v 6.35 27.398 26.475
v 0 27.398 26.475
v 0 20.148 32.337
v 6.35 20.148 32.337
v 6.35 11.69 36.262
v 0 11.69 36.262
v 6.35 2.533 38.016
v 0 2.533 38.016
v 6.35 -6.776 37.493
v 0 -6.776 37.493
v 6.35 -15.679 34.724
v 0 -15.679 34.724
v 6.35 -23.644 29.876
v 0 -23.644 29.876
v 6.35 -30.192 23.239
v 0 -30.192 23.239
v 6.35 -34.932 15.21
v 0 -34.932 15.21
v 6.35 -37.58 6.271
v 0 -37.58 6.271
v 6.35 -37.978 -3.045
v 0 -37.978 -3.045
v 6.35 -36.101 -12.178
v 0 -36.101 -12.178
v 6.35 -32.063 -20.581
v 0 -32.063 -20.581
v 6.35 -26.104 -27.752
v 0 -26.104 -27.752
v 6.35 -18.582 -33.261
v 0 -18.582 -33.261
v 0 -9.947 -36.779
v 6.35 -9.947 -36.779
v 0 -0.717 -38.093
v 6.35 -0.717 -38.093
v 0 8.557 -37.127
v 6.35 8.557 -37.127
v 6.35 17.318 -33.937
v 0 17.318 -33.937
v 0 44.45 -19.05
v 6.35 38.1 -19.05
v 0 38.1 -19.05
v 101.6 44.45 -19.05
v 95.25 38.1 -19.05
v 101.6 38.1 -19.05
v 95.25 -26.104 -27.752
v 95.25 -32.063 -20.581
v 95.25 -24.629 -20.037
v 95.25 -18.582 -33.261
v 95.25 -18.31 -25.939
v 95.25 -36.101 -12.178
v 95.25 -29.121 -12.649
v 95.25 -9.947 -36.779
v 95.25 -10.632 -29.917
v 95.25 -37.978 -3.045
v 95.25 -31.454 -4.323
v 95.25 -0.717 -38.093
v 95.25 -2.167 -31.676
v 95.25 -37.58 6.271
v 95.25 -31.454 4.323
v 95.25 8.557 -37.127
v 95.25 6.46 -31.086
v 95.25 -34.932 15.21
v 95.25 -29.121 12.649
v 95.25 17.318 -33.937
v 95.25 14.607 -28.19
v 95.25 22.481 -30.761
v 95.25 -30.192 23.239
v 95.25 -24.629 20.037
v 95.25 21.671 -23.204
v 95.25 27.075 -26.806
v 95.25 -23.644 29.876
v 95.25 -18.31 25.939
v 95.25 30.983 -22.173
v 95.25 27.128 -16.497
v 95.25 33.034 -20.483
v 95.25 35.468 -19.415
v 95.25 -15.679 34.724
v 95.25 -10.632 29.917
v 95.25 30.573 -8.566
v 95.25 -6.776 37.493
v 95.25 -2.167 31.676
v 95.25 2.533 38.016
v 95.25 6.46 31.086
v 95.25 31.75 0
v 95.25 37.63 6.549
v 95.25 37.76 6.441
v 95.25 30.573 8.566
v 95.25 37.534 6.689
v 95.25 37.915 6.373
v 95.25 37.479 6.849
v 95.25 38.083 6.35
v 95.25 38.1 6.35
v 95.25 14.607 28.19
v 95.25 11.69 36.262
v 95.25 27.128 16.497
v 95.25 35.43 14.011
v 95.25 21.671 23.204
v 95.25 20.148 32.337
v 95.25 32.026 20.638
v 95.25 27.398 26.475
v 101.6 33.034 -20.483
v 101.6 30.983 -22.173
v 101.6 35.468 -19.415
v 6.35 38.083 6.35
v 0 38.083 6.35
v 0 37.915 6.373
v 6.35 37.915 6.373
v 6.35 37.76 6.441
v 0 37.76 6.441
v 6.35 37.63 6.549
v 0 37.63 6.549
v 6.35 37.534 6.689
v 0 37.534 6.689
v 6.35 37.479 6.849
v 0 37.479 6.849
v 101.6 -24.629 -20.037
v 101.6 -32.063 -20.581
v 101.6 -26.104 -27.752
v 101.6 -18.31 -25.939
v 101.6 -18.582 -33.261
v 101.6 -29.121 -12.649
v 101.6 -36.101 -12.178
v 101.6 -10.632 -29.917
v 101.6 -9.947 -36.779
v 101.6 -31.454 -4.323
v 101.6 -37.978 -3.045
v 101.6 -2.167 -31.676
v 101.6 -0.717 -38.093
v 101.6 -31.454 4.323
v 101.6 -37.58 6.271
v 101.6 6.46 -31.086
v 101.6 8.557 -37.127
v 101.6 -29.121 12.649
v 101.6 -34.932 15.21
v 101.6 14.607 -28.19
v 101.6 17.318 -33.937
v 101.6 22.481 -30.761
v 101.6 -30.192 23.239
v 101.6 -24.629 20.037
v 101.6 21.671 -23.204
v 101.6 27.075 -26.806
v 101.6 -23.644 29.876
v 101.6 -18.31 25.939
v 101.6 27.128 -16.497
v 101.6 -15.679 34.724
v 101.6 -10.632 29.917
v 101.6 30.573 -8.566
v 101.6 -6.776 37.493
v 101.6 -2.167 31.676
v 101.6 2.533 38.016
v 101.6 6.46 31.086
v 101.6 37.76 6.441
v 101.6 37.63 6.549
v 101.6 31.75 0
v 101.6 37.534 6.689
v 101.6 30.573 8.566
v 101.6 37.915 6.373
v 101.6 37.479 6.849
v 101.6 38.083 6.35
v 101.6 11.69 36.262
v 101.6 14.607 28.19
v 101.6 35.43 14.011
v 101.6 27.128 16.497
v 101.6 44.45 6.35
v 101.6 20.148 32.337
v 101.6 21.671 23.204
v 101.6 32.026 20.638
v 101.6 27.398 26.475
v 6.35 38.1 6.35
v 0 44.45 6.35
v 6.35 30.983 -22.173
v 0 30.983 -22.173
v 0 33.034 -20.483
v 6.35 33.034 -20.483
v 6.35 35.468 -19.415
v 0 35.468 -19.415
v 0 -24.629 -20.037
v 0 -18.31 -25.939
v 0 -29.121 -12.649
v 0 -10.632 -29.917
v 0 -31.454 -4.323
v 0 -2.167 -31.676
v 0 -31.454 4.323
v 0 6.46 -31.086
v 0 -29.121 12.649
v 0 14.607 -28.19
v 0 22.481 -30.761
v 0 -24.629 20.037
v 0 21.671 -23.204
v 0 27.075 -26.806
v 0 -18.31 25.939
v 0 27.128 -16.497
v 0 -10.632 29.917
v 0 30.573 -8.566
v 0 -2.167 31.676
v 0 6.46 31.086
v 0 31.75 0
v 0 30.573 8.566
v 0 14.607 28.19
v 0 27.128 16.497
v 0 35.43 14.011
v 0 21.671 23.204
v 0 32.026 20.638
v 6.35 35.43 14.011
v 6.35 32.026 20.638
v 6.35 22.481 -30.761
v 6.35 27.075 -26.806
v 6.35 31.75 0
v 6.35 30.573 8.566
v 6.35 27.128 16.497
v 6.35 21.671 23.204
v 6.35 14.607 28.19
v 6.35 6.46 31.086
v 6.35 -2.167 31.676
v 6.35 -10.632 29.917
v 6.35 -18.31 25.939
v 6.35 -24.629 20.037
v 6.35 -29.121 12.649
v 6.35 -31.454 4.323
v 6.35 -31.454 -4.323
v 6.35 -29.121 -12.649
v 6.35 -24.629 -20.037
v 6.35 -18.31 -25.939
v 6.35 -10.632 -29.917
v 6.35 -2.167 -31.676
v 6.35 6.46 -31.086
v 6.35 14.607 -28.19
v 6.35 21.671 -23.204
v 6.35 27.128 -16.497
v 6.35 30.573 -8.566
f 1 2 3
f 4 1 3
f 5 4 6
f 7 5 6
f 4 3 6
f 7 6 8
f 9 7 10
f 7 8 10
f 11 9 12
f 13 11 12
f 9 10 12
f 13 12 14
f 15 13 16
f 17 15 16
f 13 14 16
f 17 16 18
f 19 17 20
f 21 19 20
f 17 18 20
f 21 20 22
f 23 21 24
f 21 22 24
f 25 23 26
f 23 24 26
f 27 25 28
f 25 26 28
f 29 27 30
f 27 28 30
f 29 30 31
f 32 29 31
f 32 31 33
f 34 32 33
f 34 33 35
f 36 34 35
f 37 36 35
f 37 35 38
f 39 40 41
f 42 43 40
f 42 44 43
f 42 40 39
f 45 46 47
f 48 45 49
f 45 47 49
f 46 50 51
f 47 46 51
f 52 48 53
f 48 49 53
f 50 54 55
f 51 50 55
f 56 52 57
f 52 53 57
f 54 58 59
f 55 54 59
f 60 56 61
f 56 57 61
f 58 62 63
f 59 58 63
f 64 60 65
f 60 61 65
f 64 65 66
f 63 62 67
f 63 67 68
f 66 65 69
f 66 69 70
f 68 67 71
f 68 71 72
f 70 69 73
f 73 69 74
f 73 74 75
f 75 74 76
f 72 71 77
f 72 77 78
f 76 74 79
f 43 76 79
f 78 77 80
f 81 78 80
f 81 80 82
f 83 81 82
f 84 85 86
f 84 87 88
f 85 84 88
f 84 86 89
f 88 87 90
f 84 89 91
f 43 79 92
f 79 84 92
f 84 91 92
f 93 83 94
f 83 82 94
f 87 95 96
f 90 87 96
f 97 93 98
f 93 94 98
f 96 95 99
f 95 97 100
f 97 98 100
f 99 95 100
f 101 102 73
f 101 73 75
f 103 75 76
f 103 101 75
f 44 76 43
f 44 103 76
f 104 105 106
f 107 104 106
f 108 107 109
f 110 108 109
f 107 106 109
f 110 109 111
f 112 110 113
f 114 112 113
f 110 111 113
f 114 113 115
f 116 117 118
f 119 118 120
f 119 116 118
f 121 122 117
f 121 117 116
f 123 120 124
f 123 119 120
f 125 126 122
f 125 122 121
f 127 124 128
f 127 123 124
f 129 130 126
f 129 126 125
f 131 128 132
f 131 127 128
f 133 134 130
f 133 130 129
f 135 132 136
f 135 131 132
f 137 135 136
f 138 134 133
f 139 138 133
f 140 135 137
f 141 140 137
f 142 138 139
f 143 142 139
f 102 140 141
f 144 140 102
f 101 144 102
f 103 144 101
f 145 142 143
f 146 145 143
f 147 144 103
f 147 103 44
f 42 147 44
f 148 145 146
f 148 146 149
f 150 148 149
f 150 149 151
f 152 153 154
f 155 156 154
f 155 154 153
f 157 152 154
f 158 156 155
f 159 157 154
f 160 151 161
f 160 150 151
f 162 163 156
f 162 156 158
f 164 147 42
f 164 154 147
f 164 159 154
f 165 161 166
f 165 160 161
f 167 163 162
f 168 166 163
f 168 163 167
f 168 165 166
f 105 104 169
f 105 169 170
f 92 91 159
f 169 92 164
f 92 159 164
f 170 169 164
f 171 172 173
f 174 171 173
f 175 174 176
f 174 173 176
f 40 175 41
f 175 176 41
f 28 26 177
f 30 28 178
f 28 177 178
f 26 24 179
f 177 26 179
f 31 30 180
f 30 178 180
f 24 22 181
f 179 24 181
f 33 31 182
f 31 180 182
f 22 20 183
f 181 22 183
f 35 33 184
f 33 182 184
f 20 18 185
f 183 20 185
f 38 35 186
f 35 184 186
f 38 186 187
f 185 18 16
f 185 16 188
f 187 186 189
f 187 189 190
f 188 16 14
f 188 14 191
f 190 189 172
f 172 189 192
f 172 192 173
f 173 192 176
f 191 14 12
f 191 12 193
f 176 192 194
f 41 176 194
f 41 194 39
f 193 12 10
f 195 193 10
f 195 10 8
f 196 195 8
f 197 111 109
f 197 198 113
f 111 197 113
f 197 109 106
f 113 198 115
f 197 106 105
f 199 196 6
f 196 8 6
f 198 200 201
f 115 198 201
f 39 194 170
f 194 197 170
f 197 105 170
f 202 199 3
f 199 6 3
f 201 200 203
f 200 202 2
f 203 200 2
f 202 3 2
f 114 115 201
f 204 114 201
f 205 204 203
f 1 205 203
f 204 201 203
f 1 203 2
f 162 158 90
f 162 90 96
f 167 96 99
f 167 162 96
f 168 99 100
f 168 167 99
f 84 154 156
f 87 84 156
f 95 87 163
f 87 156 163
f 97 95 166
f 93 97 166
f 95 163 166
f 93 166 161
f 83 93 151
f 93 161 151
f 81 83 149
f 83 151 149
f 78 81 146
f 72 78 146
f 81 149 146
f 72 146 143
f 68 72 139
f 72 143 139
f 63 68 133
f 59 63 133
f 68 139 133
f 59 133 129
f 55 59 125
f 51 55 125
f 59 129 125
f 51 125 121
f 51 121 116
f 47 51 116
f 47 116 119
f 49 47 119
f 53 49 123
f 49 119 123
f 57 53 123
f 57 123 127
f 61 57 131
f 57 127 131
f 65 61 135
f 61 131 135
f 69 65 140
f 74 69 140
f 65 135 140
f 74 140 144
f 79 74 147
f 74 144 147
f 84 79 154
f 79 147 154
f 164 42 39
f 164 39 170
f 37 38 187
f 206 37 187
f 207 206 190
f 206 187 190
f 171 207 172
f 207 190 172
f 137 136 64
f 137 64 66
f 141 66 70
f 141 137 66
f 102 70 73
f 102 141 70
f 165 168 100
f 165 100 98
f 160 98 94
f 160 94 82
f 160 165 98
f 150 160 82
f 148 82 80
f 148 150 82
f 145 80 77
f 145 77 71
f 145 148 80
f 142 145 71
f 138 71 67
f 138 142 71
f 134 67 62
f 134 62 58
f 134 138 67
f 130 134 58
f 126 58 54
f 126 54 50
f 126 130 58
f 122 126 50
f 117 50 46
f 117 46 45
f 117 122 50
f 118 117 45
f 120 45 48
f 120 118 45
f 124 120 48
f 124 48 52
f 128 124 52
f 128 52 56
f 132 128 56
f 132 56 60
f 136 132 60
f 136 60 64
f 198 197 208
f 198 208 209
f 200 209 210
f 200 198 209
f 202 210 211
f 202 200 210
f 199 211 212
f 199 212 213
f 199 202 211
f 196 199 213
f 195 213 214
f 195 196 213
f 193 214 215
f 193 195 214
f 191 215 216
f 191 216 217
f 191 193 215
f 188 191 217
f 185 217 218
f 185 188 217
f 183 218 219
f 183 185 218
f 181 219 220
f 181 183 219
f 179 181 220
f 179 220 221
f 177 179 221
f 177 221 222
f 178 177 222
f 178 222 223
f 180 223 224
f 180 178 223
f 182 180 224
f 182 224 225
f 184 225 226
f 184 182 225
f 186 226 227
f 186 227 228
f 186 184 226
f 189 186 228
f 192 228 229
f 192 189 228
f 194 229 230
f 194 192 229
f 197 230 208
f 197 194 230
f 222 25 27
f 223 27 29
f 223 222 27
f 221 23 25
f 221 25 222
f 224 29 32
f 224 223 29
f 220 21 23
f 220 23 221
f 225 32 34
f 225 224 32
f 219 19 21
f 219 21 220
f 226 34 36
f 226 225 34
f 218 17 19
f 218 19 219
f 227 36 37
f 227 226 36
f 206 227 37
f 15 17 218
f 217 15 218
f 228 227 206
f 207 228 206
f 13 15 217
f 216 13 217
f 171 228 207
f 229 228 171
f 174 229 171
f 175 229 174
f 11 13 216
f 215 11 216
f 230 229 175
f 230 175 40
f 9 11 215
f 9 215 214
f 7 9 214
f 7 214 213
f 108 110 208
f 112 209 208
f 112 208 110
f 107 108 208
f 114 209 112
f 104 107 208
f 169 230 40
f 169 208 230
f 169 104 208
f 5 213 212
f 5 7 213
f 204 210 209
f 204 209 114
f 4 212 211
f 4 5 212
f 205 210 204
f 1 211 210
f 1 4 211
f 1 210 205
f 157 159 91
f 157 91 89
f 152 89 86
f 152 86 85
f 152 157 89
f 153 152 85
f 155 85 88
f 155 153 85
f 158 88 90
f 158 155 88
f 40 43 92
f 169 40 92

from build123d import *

# Parameters (mm, degrees)
F0_R     = 31.75
F1_DEPTH = 6.35
F2_W     = 6.35
F2_H     = 25.399766
F3_DEPTH = 44.45


with BuildPart() as f1:
    # F0 (on Right) → F1 (new body)
    with BuildSketch(Plane.YZ):
        with BuildLine():
            ThreePointArc((37.479318, 6.849139), (33.890578, 17.408007), (27.398215, 26.475419))
            ThreePointArc((27.398215, 26.475419), (-37.580446, 6.270574), (17.318016, -33.936652))
            ThreePointArc((17.318016, -33.936652), (24.856502, -28.874977), (30.983175, -22.173246))
            ThreePointArc((30.983175, -22.173246), (36.27719, -11.64369), (38.1, 0))
            ThreePointArc((38.1, 0), (37.944512, 3.438602), (37.479318, 6.849139))
        make_face()
        Circle(F0_R, mode=Mode.SUBTRACT)
        with BuildLine():
            ThreePointArc((38.083032, 6.349766), (37.691291, 6.490788), (37.479318, 6.849139))
            ThreePointArc((37.479318, 6.849139), (37.944512, 3.438602), (38.1, 0))
            ThreePointArc((38.1, 0), (36.27719, -11.64369), (30.983175, -22.173246))
            ThreePointArc((30.983175, -22.173246), (34.214004, -19.86517), (38.1, -19.05))
            Line((38.1, -19.05), (44.45, -19.05))
            Line((44.45, -19.05), (44.45, 6.349766))
            Line((44.45, 6.349766), (38.083032, 6.349766))
        make_face()
    extrude(amount=F1_DEPTH)

    # F2 (on face) → F3 (join)
    with BuildSketch(Plane.YZ.offset(6.35)):
        with Locations((41.275, -6.350117)):
            Rectangle(F2_W, F2_H)
    extrude(amount=F3_DEPTH)

    # F4: F1 across face


with BuildPart() as f1_1:
    add(f1.part)
    add(f1.part.mirror(Plane(origin=(50.8, 41.275, -6.350117), x_dir=(0, 1, 0), z_dir=(1, 0, 0))))


solid = f1_1.part
